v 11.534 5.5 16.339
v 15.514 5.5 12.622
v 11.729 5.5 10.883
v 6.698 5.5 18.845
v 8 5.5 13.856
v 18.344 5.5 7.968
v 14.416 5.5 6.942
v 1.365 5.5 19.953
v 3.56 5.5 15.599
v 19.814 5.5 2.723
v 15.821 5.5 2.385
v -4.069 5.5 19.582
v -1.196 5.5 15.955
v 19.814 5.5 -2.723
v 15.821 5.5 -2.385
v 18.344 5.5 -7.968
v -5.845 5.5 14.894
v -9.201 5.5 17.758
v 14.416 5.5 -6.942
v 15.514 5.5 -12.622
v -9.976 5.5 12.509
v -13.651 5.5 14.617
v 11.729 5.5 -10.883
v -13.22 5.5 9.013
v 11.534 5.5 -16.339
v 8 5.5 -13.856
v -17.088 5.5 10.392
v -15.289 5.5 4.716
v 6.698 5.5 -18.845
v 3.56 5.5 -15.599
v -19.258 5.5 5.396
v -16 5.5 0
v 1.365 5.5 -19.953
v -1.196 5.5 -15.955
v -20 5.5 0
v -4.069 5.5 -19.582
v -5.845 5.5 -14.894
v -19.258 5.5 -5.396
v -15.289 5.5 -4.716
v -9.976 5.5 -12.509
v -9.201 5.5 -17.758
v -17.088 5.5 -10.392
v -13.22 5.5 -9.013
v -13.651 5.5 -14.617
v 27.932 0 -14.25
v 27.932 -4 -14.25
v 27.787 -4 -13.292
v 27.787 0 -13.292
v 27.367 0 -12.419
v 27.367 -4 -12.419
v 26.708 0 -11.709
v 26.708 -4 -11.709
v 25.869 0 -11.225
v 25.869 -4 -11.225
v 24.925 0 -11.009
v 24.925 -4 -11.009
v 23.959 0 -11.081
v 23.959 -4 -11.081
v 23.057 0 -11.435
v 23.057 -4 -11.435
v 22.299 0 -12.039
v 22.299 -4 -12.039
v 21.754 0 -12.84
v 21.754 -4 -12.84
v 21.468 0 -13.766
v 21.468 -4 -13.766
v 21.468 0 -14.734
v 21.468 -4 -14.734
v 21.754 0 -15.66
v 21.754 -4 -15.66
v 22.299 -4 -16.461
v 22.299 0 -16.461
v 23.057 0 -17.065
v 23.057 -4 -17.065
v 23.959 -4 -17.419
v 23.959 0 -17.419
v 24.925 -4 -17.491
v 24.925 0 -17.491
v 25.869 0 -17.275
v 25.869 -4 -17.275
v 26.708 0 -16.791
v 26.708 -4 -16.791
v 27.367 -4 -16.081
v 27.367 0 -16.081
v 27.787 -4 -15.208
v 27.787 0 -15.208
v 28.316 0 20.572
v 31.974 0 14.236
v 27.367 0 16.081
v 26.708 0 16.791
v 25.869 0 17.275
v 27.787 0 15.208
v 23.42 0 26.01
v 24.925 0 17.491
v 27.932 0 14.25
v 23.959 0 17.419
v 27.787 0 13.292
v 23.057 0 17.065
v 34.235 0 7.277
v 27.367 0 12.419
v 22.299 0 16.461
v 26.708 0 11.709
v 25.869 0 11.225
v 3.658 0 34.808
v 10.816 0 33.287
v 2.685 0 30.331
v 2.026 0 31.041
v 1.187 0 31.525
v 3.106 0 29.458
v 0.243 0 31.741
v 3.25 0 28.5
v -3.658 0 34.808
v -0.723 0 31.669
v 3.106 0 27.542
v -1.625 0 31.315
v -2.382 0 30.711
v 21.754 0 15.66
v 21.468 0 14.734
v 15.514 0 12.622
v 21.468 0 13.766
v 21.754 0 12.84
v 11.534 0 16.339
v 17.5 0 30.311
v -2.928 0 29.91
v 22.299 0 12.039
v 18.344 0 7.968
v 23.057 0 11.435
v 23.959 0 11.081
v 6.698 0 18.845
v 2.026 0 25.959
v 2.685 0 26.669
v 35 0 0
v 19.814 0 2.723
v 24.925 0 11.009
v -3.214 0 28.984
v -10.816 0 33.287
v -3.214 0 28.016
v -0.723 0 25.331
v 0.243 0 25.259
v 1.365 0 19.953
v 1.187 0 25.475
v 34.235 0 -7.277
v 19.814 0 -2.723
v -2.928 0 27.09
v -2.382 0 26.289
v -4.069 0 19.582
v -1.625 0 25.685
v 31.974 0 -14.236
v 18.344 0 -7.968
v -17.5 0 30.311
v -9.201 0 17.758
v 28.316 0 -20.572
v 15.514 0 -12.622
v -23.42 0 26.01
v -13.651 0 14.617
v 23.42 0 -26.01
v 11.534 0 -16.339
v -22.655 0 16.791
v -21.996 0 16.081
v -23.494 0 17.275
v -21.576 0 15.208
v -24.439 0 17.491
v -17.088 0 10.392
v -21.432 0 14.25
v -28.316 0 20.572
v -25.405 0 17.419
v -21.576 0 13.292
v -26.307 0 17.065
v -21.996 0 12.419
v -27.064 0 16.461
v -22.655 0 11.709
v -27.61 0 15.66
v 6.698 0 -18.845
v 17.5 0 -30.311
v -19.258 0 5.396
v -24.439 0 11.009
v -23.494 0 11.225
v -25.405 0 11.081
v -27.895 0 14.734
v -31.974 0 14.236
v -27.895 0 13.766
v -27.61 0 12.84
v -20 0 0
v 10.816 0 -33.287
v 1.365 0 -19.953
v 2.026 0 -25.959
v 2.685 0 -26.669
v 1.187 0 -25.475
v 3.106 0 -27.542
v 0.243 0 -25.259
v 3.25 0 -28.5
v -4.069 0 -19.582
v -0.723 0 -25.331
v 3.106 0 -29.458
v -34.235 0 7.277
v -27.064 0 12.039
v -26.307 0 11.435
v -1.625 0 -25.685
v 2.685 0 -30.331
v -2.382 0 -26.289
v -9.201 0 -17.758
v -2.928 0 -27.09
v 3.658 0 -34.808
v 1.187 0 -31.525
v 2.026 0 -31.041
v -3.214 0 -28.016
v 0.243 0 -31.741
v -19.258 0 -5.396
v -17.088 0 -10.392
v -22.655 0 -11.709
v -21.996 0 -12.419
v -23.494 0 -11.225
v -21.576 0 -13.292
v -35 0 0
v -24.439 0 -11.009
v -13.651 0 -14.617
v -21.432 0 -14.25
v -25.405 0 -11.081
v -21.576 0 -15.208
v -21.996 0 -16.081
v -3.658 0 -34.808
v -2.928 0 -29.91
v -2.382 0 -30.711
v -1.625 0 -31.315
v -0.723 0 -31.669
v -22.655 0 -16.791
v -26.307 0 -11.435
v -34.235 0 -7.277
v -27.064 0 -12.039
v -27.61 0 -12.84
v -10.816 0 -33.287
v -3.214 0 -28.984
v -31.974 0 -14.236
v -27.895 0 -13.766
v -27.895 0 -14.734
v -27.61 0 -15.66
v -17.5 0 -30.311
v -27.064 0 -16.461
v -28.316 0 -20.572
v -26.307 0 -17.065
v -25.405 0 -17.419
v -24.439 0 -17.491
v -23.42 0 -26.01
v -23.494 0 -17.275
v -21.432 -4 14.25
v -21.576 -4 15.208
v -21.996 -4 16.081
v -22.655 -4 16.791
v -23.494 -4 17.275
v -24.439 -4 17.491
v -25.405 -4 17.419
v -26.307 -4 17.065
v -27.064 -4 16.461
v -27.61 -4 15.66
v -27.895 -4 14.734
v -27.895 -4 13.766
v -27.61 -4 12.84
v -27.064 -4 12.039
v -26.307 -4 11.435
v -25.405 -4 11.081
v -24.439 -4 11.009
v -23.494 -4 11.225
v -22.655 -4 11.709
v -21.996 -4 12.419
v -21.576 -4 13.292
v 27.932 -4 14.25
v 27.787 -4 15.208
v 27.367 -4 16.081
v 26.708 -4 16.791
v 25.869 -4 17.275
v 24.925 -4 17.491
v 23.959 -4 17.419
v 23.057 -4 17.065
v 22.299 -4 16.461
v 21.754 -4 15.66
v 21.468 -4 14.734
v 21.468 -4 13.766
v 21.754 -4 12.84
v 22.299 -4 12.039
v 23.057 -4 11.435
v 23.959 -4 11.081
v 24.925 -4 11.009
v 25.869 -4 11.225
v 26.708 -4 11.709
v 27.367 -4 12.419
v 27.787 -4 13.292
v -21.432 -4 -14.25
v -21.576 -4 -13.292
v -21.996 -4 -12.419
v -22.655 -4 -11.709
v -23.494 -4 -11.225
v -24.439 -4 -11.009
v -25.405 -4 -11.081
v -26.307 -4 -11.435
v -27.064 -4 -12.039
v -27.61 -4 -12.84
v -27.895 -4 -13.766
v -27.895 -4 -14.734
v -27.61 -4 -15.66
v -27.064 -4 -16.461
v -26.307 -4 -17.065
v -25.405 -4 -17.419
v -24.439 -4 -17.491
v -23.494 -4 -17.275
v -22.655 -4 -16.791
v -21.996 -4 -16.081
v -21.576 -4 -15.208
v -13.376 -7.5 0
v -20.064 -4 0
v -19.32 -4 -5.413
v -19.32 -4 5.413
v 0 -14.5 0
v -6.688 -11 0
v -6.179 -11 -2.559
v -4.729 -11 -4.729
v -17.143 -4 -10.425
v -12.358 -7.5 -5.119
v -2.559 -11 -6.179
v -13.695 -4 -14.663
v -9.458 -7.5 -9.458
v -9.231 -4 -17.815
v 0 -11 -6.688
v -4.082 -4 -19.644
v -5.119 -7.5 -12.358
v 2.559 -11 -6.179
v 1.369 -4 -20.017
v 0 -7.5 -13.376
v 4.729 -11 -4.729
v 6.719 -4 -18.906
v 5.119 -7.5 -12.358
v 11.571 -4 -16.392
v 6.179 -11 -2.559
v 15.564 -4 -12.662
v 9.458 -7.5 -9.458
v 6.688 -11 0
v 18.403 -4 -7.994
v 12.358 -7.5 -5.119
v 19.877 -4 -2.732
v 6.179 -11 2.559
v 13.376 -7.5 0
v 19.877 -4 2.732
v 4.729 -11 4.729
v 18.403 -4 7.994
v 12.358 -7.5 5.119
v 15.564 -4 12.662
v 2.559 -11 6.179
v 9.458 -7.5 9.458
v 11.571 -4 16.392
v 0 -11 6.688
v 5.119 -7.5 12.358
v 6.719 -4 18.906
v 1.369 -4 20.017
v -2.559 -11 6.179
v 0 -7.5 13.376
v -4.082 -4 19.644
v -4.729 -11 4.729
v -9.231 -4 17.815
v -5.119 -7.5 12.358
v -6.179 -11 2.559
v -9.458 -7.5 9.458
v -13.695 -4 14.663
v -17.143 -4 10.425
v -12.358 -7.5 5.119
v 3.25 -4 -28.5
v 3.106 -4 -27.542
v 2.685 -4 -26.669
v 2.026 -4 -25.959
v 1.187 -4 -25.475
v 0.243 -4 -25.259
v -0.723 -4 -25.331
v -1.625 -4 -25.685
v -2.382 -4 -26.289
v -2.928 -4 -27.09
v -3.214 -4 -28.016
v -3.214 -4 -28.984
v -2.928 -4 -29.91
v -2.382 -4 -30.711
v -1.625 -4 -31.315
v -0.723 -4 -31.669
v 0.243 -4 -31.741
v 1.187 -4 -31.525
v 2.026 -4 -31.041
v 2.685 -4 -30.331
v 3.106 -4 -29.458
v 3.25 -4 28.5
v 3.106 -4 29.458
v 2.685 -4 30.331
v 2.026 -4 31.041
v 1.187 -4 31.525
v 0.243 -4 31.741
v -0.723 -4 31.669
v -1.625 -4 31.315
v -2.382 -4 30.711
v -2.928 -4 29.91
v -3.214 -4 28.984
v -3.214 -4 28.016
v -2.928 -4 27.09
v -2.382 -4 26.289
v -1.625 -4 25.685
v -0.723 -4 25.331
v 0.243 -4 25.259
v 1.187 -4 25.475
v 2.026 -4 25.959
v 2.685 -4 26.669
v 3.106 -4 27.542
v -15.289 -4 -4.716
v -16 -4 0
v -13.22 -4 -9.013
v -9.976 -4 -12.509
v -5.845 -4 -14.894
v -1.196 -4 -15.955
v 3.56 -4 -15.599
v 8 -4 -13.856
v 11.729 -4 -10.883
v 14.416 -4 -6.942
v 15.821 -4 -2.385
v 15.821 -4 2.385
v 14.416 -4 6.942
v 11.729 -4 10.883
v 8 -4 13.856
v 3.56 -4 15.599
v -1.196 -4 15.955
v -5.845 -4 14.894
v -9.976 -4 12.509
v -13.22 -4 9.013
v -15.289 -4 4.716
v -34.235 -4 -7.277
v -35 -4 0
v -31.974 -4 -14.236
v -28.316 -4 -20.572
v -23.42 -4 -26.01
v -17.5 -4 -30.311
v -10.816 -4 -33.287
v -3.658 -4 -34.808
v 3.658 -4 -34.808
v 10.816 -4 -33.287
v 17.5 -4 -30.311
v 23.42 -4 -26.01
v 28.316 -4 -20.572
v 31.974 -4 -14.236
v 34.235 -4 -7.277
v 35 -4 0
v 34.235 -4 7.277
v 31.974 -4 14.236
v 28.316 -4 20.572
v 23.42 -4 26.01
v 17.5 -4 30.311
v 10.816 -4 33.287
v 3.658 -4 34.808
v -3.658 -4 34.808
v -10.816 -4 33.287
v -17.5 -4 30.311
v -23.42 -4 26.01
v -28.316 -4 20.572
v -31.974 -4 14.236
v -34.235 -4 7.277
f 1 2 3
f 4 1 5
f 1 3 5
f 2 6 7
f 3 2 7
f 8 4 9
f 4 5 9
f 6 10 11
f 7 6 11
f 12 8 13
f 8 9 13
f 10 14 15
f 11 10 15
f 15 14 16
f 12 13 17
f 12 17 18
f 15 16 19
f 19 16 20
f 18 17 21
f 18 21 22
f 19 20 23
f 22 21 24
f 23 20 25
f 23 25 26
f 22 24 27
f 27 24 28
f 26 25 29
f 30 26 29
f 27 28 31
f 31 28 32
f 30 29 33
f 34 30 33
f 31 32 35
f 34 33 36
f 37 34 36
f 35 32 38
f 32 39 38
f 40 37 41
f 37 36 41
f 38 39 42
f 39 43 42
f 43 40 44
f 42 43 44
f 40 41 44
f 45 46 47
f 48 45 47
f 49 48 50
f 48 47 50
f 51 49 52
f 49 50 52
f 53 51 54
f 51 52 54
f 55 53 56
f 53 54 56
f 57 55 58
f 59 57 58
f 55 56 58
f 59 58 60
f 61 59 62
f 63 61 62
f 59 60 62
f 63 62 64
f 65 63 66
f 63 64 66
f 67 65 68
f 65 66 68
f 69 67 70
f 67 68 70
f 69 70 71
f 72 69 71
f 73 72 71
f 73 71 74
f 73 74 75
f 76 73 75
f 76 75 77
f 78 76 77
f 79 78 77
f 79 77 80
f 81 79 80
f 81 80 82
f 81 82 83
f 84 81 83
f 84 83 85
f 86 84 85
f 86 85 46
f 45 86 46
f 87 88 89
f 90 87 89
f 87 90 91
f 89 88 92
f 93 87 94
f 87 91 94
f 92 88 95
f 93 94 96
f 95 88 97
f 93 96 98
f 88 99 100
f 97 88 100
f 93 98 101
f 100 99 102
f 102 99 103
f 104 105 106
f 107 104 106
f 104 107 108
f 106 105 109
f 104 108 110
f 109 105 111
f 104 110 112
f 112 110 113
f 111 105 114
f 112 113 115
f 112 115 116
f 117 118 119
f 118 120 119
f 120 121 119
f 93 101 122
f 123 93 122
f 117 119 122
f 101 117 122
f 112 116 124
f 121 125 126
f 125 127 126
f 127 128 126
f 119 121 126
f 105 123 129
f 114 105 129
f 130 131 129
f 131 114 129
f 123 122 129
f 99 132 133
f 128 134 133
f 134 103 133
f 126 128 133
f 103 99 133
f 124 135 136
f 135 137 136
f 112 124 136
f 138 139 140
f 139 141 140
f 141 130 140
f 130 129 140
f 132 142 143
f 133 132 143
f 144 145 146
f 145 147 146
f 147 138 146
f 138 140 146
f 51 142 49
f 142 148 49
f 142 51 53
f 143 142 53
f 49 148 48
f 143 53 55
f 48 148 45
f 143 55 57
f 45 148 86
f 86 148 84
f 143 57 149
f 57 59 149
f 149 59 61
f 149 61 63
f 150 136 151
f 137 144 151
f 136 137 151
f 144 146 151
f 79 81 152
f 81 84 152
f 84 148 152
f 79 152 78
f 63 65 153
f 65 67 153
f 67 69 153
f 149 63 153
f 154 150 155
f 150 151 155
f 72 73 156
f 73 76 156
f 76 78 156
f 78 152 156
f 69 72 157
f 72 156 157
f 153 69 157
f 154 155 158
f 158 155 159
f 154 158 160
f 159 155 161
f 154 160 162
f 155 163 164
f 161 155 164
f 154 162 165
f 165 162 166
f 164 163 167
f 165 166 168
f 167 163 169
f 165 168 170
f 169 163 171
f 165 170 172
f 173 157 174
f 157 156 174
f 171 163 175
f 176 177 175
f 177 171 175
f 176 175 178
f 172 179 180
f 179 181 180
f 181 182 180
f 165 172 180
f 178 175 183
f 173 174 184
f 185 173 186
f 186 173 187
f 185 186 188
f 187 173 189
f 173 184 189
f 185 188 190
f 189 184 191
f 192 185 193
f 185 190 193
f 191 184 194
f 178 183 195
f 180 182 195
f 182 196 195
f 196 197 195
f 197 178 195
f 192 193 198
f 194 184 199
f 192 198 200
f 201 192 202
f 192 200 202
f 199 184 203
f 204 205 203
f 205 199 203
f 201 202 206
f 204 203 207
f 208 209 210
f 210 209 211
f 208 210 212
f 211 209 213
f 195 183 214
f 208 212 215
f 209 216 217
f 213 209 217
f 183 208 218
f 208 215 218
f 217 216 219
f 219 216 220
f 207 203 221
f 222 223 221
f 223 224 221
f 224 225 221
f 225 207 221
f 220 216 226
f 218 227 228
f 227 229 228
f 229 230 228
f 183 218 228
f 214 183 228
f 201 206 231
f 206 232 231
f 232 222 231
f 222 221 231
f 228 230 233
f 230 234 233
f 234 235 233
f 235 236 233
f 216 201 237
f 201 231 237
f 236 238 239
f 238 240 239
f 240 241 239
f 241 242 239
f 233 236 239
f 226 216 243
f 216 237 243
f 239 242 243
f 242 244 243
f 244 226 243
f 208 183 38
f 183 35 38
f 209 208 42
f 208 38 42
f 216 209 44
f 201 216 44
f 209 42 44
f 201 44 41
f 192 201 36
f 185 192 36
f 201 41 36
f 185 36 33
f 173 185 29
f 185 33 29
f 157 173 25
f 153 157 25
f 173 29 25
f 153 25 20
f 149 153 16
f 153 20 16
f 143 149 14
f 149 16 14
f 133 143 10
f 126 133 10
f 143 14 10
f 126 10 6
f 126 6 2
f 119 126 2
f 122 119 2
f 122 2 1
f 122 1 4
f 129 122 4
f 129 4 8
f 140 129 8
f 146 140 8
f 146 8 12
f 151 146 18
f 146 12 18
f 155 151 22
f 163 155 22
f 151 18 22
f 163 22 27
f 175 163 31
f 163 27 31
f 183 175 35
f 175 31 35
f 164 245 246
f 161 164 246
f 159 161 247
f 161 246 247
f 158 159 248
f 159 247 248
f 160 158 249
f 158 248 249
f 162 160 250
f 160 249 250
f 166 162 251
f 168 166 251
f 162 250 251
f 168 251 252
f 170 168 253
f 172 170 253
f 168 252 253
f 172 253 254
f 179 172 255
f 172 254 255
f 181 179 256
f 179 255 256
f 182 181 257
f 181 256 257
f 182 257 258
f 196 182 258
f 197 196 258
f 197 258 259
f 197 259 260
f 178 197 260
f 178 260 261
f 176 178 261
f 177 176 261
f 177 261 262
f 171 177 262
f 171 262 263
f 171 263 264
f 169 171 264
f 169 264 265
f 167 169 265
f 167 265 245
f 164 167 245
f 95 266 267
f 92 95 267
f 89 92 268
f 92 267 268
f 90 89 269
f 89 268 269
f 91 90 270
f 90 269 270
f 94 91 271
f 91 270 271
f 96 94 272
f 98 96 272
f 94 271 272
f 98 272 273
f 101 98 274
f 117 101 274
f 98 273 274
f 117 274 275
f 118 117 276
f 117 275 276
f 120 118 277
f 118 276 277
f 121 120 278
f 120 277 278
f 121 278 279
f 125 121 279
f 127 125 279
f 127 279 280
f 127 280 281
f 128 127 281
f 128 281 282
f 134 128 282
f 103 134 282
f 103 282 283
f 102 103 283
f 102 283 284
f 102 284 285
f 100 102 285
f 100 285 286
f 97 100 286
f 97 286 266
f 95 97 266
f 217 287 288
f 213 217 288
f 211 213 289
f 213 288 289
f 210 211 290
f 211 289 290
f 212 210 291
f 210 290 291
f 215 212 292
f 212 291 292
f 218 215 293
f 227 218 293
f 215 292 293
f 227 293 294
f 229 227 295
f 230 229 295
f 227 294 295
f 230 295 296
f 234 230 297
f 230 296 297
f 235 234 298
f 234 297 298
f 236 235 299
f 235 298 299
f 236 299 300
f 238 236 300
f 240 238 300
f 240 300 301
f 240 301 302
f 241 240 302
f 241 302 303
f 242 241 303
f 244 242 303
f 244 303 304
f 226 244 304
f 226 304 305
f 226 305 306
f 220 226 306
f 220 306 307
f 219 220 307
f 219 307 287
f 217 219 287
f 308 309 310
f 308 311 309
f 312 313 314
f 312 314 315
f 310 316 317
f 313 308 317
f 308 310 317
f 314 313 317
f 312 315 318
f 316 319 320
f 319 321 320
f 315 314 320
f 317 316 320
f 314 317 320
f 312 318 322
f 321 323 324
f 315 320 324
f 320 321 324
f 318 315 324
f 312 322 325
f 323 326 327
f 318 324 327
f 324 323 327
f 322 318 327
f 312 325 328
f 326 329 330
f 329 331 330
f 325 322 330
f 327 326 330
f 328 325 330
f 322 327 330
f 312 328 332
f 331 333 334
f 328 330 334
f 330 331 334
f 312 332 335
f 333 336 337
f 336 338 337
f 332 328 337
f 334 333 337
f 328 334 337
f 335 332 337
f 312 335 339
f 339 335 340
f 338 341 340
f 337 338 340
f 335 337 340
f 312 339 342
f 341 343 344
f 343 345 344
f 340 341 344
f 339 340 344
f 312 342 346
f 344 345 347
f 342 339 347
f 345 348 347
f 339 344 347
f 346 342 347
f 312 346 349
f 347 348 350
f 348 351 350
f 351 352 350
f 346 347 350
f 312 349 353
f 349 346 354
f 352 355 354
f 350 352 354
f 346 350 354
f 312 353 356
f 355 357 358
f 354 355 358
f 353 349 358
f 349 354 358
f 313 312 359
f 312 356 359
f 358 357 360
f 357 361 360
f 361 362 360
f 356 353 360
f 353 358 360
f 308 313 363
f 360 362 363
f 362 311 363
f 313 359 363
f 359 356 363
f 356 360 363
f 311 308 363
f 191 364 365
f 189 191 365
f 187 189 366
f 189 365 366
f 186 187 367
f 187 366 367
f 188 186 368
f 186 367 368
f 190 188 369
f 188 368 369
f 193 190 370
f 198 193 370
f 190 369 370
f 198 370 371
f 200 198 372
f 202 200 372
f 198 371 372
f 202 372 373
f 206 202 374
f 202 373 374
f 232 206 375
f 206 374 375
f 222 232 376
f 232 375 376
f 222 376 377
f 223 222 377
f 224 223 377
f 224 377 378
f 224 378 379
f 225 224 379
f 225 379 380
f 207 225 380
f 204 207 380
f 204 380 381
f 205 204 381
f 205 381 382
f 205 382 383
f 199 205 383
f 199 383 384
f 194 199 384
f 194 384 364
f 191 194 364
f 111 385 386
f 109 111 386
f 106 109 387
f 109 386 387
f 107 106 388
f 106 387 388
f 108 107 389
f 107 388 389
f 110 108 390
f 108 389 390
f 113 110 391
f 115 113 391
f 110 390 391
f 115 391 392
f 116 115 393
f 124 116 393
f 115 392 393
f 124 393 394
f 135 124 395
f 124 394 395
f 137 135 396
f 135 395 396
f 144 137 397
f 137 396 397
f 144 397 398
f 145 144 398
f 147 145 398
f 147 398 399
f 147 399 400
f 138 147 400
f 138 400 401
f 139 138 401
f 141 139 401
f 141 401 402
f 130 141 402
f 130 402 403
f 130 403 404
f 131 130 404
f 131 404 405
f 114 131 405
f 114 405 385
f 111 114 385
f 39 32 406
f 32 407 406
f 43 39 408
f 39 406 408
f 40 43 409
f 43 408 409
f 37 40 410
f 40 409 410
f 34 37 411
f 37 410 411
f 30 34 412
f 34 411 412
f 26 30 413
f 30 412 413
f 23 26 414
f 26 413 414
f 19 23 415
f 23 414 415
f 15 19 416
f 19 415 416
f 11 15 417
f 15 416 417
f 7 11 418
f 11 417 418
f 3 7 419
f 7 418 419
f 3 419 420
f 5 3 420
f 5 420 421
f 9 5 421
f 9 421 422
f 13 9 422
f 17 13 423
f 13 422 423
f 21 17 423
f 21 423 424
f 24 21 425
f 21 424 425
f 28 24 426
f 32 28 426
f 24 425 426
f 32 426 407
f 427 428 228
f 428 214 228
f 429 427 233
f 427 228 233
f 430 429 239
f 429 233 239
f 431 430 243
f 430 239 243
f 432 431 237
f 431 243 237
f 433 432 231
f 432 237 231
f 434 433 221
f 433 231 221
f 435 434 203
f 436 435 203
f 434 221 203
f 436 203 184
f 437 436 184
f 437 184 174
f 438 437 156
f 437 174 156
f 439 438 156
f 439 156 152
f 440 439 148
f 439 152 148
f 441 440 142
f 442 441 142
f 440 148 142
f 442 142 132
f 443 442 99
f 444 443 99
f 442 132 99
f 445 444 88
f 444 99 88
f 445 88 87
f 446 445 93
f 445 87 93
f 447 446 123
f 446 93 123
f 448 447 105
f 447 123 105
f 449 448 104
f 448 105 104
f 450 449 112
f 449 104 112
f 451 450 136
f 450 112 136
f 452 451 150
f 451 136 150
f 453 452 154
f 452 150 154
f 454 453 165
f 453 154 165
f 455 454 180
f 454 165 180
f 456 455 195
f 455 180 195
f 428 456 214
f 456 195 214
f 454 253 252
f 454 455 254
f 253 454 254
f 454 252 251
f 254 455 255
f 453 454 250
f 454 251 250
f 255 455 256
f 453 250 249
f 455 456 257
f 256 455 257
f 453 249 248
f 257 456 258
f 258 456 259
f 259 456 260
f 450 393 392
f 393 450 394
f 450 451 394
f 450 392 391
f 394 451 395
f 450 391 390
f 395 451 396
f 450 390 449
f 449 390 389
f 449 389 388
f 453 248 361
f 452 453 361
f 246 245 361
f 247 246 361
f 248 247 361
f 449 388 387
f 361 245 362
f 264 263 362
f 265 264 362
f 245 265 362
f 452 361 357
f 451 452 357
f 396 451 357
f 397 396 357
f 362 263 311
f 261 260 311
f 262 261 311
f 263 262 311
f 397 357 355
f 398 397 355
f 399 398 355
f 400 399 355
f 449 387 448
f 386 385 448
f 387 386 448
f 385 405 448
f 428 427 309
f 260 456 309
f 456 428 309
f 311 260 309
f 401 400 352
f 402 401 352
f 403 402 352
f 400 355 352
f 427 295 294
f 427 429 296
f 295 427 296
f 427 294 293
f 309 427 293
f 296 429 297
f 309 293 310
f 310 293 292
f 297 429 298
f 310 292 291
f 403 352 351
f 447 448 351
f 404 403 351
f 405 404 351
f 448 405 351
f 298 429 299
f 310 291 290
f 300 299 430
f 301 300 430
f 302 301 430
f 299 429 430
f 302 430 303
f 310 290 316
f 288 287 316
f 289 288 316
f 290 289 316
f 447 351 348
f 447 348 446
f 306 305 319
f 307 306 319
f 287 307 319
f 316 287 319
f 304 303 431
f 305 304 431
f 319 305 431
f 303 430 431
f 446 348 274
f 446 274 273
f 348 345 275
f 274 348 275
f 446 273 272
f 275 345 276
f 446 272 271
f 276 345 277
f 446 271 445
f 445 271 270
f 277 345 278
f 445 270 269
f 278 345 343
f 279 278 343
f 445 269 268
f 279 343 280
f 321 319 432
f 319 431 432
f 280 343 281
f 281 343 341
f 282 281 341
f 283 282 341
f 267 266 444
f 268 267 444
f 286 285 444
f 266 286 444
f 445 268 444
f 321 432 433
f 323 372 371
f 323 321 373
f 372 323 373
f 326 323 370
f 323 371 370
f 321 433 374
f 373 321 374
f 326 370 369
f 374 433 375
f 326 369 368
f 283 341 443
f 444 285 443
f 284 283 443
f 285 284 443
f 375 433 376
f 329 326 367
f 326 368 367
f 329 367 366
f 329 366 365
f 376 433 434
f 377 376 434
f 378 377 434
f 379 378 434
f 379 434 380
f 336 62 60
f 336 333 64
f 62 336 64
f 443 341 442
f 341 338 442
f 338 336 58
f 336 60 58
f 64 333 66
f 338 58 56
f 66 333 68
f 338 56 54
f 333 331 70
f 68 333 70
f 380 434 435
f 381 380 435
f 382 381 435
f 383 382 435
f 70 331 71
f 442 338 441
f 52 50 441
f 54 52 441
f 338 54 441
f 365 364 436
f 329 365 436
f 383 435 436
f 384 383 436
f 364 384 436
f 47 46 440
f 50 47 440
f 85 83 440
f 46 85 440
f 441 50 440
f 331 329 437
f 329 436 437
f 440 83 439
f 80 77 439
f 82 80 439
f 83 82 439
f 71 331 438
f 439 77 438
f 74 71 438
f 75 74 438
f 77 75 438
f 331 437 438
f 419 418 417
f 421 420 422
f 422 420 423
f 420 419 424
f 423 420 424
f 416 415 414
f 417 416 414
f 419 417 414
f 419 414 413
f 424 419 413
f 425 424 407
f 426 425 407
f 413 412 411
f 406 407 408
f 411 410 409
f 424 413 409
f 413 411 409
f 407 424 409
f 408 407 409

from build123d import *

# Parameters (mm, degrees)
SKETCH2_R          = 3.25
CUT_EXTRUDE1_DEPTH = 10


with BuildPart() as part:
    # Sketch1 → Revolve1 (revolve)
    with BuildSketch(Plane.XY):
        Polygon((0, -4), (0, -14.5), (-20.063981043, -4), (-35, -4), (-35, 0), (-20, 0), (-20, 5.5), (-16, 5.5), (-16, -4), align=None)
    revolve(axis=Axis((0, 0, 0), (0, -1, 0)))

    # Sketch2 → Cut-Extrude1 (cut)
    with BuildSketch(Plane.XZ.offset(4)):
        with Locations((0, 28.5)):
            Circle(SKETCH2_R)
        with Locations((24.681724008, 14.25)):
            Circle(SKETCH2_R)
        with Locations((24.681724008, -14.25)):
            Circle(SKETCH2_R)
        with Locations((0, -28.5)):
            Circle(SKETCH2_R)
        with Locations((-24.681724008, -14.25)):
            Circle(SKETCH2_R)
        with Locations((-24.681724008, 14.25)):
            Circle(SKETCH2_R)
    extrude(amount=-CUT_EXTRUDE1_DEPTH, mode=Mode.SUBTRACT)


solid = part.part
